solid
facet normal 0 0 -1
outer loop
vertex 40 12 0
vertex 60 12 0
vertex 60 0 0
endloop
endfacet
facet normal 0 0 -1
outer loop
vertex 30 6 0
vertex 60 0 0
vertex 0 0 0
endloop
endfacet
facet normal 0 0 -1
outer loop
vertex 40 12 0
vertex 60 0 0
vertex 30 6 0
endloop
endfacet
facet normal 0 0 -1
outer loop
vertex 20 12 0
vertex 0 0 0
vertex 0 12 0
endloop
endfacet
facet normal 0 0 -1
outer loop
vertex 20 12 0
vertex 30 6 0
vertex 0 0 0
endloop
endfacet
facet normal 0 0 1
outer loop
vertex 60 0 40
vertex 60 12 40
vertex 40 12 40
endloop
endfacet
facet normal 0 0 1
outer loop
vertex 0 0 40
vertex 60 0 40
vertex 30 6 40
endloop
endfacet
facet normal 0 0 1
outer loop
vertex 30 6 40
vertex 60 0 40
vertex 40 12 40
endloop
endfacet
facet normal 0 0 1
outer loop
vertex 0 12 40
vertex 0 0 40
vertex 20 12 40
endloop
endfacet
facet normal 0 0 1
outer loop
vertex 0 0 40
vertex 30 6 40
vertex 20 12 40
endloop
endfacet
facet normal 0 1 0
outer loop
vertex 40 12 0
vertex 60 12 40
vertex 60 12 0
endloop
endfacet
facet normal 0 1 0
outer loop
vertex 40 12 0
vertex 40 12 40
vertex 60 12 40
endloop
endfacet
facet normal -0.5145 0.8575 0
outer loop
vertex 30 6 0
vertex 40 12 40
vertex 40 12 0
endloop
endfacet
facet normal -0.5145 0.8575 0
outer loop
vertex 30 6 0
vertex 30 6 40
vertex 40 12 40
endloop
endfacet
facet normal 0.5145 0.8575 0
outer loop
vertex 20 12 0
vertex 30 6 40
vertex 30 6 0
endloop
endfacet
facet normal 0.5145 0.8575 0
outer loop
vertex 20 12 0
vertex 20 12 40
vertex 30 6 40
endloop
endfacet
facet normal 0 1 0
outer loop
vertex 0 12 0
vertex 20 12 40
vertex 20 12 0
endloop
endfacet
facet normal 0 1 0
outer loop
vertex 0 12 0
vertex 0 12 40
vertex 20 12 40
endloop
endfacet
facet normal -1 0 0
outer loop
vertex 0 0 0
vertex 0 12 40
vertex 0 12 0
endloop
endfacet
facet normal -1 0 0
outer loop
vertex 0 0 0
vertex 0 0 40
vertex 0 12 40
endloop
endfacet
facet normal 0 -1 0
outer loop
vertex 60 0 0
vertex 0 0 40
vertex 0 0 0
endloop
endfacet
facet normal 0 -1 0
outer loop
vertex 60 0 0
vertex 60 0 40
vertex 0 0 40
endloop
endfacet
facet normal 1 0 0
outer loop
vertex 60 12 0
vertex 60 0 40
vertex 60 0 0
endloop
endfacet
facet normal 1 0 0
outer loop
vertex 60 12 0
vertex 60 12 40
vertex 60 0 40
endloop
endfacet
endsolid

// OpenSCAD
$fn = 32;

// ----------------------------------------------------------------------
// V guide rail: vway, 60 mm wide
// ----------------------------------------------------------------------

// --- parameters (mm) ---
rail_w = 60;              // rail width, X
base_t = 12;              // base plate thickness
v_depth = 6;              // V feature depth / height
v_half_w = 10;            // half width of the V at the base face
plate_t = 40;             // rail length, Z (the extrusion height)
fit_tol = 0.02;           // declared fit tolerance (prompt contract)
free_tol = 0.2;           // declared free tolerance (prompt contract)

profile = [[0, 0], [60, 0], [60, 12], [40, 12], [30, 6], [20, 12], [0, 12]];  // primary outline, 7 points, counter clockwise

// --- the one profile operation ---
linear_extrude(height = plate_t) polygon(points = profile);
